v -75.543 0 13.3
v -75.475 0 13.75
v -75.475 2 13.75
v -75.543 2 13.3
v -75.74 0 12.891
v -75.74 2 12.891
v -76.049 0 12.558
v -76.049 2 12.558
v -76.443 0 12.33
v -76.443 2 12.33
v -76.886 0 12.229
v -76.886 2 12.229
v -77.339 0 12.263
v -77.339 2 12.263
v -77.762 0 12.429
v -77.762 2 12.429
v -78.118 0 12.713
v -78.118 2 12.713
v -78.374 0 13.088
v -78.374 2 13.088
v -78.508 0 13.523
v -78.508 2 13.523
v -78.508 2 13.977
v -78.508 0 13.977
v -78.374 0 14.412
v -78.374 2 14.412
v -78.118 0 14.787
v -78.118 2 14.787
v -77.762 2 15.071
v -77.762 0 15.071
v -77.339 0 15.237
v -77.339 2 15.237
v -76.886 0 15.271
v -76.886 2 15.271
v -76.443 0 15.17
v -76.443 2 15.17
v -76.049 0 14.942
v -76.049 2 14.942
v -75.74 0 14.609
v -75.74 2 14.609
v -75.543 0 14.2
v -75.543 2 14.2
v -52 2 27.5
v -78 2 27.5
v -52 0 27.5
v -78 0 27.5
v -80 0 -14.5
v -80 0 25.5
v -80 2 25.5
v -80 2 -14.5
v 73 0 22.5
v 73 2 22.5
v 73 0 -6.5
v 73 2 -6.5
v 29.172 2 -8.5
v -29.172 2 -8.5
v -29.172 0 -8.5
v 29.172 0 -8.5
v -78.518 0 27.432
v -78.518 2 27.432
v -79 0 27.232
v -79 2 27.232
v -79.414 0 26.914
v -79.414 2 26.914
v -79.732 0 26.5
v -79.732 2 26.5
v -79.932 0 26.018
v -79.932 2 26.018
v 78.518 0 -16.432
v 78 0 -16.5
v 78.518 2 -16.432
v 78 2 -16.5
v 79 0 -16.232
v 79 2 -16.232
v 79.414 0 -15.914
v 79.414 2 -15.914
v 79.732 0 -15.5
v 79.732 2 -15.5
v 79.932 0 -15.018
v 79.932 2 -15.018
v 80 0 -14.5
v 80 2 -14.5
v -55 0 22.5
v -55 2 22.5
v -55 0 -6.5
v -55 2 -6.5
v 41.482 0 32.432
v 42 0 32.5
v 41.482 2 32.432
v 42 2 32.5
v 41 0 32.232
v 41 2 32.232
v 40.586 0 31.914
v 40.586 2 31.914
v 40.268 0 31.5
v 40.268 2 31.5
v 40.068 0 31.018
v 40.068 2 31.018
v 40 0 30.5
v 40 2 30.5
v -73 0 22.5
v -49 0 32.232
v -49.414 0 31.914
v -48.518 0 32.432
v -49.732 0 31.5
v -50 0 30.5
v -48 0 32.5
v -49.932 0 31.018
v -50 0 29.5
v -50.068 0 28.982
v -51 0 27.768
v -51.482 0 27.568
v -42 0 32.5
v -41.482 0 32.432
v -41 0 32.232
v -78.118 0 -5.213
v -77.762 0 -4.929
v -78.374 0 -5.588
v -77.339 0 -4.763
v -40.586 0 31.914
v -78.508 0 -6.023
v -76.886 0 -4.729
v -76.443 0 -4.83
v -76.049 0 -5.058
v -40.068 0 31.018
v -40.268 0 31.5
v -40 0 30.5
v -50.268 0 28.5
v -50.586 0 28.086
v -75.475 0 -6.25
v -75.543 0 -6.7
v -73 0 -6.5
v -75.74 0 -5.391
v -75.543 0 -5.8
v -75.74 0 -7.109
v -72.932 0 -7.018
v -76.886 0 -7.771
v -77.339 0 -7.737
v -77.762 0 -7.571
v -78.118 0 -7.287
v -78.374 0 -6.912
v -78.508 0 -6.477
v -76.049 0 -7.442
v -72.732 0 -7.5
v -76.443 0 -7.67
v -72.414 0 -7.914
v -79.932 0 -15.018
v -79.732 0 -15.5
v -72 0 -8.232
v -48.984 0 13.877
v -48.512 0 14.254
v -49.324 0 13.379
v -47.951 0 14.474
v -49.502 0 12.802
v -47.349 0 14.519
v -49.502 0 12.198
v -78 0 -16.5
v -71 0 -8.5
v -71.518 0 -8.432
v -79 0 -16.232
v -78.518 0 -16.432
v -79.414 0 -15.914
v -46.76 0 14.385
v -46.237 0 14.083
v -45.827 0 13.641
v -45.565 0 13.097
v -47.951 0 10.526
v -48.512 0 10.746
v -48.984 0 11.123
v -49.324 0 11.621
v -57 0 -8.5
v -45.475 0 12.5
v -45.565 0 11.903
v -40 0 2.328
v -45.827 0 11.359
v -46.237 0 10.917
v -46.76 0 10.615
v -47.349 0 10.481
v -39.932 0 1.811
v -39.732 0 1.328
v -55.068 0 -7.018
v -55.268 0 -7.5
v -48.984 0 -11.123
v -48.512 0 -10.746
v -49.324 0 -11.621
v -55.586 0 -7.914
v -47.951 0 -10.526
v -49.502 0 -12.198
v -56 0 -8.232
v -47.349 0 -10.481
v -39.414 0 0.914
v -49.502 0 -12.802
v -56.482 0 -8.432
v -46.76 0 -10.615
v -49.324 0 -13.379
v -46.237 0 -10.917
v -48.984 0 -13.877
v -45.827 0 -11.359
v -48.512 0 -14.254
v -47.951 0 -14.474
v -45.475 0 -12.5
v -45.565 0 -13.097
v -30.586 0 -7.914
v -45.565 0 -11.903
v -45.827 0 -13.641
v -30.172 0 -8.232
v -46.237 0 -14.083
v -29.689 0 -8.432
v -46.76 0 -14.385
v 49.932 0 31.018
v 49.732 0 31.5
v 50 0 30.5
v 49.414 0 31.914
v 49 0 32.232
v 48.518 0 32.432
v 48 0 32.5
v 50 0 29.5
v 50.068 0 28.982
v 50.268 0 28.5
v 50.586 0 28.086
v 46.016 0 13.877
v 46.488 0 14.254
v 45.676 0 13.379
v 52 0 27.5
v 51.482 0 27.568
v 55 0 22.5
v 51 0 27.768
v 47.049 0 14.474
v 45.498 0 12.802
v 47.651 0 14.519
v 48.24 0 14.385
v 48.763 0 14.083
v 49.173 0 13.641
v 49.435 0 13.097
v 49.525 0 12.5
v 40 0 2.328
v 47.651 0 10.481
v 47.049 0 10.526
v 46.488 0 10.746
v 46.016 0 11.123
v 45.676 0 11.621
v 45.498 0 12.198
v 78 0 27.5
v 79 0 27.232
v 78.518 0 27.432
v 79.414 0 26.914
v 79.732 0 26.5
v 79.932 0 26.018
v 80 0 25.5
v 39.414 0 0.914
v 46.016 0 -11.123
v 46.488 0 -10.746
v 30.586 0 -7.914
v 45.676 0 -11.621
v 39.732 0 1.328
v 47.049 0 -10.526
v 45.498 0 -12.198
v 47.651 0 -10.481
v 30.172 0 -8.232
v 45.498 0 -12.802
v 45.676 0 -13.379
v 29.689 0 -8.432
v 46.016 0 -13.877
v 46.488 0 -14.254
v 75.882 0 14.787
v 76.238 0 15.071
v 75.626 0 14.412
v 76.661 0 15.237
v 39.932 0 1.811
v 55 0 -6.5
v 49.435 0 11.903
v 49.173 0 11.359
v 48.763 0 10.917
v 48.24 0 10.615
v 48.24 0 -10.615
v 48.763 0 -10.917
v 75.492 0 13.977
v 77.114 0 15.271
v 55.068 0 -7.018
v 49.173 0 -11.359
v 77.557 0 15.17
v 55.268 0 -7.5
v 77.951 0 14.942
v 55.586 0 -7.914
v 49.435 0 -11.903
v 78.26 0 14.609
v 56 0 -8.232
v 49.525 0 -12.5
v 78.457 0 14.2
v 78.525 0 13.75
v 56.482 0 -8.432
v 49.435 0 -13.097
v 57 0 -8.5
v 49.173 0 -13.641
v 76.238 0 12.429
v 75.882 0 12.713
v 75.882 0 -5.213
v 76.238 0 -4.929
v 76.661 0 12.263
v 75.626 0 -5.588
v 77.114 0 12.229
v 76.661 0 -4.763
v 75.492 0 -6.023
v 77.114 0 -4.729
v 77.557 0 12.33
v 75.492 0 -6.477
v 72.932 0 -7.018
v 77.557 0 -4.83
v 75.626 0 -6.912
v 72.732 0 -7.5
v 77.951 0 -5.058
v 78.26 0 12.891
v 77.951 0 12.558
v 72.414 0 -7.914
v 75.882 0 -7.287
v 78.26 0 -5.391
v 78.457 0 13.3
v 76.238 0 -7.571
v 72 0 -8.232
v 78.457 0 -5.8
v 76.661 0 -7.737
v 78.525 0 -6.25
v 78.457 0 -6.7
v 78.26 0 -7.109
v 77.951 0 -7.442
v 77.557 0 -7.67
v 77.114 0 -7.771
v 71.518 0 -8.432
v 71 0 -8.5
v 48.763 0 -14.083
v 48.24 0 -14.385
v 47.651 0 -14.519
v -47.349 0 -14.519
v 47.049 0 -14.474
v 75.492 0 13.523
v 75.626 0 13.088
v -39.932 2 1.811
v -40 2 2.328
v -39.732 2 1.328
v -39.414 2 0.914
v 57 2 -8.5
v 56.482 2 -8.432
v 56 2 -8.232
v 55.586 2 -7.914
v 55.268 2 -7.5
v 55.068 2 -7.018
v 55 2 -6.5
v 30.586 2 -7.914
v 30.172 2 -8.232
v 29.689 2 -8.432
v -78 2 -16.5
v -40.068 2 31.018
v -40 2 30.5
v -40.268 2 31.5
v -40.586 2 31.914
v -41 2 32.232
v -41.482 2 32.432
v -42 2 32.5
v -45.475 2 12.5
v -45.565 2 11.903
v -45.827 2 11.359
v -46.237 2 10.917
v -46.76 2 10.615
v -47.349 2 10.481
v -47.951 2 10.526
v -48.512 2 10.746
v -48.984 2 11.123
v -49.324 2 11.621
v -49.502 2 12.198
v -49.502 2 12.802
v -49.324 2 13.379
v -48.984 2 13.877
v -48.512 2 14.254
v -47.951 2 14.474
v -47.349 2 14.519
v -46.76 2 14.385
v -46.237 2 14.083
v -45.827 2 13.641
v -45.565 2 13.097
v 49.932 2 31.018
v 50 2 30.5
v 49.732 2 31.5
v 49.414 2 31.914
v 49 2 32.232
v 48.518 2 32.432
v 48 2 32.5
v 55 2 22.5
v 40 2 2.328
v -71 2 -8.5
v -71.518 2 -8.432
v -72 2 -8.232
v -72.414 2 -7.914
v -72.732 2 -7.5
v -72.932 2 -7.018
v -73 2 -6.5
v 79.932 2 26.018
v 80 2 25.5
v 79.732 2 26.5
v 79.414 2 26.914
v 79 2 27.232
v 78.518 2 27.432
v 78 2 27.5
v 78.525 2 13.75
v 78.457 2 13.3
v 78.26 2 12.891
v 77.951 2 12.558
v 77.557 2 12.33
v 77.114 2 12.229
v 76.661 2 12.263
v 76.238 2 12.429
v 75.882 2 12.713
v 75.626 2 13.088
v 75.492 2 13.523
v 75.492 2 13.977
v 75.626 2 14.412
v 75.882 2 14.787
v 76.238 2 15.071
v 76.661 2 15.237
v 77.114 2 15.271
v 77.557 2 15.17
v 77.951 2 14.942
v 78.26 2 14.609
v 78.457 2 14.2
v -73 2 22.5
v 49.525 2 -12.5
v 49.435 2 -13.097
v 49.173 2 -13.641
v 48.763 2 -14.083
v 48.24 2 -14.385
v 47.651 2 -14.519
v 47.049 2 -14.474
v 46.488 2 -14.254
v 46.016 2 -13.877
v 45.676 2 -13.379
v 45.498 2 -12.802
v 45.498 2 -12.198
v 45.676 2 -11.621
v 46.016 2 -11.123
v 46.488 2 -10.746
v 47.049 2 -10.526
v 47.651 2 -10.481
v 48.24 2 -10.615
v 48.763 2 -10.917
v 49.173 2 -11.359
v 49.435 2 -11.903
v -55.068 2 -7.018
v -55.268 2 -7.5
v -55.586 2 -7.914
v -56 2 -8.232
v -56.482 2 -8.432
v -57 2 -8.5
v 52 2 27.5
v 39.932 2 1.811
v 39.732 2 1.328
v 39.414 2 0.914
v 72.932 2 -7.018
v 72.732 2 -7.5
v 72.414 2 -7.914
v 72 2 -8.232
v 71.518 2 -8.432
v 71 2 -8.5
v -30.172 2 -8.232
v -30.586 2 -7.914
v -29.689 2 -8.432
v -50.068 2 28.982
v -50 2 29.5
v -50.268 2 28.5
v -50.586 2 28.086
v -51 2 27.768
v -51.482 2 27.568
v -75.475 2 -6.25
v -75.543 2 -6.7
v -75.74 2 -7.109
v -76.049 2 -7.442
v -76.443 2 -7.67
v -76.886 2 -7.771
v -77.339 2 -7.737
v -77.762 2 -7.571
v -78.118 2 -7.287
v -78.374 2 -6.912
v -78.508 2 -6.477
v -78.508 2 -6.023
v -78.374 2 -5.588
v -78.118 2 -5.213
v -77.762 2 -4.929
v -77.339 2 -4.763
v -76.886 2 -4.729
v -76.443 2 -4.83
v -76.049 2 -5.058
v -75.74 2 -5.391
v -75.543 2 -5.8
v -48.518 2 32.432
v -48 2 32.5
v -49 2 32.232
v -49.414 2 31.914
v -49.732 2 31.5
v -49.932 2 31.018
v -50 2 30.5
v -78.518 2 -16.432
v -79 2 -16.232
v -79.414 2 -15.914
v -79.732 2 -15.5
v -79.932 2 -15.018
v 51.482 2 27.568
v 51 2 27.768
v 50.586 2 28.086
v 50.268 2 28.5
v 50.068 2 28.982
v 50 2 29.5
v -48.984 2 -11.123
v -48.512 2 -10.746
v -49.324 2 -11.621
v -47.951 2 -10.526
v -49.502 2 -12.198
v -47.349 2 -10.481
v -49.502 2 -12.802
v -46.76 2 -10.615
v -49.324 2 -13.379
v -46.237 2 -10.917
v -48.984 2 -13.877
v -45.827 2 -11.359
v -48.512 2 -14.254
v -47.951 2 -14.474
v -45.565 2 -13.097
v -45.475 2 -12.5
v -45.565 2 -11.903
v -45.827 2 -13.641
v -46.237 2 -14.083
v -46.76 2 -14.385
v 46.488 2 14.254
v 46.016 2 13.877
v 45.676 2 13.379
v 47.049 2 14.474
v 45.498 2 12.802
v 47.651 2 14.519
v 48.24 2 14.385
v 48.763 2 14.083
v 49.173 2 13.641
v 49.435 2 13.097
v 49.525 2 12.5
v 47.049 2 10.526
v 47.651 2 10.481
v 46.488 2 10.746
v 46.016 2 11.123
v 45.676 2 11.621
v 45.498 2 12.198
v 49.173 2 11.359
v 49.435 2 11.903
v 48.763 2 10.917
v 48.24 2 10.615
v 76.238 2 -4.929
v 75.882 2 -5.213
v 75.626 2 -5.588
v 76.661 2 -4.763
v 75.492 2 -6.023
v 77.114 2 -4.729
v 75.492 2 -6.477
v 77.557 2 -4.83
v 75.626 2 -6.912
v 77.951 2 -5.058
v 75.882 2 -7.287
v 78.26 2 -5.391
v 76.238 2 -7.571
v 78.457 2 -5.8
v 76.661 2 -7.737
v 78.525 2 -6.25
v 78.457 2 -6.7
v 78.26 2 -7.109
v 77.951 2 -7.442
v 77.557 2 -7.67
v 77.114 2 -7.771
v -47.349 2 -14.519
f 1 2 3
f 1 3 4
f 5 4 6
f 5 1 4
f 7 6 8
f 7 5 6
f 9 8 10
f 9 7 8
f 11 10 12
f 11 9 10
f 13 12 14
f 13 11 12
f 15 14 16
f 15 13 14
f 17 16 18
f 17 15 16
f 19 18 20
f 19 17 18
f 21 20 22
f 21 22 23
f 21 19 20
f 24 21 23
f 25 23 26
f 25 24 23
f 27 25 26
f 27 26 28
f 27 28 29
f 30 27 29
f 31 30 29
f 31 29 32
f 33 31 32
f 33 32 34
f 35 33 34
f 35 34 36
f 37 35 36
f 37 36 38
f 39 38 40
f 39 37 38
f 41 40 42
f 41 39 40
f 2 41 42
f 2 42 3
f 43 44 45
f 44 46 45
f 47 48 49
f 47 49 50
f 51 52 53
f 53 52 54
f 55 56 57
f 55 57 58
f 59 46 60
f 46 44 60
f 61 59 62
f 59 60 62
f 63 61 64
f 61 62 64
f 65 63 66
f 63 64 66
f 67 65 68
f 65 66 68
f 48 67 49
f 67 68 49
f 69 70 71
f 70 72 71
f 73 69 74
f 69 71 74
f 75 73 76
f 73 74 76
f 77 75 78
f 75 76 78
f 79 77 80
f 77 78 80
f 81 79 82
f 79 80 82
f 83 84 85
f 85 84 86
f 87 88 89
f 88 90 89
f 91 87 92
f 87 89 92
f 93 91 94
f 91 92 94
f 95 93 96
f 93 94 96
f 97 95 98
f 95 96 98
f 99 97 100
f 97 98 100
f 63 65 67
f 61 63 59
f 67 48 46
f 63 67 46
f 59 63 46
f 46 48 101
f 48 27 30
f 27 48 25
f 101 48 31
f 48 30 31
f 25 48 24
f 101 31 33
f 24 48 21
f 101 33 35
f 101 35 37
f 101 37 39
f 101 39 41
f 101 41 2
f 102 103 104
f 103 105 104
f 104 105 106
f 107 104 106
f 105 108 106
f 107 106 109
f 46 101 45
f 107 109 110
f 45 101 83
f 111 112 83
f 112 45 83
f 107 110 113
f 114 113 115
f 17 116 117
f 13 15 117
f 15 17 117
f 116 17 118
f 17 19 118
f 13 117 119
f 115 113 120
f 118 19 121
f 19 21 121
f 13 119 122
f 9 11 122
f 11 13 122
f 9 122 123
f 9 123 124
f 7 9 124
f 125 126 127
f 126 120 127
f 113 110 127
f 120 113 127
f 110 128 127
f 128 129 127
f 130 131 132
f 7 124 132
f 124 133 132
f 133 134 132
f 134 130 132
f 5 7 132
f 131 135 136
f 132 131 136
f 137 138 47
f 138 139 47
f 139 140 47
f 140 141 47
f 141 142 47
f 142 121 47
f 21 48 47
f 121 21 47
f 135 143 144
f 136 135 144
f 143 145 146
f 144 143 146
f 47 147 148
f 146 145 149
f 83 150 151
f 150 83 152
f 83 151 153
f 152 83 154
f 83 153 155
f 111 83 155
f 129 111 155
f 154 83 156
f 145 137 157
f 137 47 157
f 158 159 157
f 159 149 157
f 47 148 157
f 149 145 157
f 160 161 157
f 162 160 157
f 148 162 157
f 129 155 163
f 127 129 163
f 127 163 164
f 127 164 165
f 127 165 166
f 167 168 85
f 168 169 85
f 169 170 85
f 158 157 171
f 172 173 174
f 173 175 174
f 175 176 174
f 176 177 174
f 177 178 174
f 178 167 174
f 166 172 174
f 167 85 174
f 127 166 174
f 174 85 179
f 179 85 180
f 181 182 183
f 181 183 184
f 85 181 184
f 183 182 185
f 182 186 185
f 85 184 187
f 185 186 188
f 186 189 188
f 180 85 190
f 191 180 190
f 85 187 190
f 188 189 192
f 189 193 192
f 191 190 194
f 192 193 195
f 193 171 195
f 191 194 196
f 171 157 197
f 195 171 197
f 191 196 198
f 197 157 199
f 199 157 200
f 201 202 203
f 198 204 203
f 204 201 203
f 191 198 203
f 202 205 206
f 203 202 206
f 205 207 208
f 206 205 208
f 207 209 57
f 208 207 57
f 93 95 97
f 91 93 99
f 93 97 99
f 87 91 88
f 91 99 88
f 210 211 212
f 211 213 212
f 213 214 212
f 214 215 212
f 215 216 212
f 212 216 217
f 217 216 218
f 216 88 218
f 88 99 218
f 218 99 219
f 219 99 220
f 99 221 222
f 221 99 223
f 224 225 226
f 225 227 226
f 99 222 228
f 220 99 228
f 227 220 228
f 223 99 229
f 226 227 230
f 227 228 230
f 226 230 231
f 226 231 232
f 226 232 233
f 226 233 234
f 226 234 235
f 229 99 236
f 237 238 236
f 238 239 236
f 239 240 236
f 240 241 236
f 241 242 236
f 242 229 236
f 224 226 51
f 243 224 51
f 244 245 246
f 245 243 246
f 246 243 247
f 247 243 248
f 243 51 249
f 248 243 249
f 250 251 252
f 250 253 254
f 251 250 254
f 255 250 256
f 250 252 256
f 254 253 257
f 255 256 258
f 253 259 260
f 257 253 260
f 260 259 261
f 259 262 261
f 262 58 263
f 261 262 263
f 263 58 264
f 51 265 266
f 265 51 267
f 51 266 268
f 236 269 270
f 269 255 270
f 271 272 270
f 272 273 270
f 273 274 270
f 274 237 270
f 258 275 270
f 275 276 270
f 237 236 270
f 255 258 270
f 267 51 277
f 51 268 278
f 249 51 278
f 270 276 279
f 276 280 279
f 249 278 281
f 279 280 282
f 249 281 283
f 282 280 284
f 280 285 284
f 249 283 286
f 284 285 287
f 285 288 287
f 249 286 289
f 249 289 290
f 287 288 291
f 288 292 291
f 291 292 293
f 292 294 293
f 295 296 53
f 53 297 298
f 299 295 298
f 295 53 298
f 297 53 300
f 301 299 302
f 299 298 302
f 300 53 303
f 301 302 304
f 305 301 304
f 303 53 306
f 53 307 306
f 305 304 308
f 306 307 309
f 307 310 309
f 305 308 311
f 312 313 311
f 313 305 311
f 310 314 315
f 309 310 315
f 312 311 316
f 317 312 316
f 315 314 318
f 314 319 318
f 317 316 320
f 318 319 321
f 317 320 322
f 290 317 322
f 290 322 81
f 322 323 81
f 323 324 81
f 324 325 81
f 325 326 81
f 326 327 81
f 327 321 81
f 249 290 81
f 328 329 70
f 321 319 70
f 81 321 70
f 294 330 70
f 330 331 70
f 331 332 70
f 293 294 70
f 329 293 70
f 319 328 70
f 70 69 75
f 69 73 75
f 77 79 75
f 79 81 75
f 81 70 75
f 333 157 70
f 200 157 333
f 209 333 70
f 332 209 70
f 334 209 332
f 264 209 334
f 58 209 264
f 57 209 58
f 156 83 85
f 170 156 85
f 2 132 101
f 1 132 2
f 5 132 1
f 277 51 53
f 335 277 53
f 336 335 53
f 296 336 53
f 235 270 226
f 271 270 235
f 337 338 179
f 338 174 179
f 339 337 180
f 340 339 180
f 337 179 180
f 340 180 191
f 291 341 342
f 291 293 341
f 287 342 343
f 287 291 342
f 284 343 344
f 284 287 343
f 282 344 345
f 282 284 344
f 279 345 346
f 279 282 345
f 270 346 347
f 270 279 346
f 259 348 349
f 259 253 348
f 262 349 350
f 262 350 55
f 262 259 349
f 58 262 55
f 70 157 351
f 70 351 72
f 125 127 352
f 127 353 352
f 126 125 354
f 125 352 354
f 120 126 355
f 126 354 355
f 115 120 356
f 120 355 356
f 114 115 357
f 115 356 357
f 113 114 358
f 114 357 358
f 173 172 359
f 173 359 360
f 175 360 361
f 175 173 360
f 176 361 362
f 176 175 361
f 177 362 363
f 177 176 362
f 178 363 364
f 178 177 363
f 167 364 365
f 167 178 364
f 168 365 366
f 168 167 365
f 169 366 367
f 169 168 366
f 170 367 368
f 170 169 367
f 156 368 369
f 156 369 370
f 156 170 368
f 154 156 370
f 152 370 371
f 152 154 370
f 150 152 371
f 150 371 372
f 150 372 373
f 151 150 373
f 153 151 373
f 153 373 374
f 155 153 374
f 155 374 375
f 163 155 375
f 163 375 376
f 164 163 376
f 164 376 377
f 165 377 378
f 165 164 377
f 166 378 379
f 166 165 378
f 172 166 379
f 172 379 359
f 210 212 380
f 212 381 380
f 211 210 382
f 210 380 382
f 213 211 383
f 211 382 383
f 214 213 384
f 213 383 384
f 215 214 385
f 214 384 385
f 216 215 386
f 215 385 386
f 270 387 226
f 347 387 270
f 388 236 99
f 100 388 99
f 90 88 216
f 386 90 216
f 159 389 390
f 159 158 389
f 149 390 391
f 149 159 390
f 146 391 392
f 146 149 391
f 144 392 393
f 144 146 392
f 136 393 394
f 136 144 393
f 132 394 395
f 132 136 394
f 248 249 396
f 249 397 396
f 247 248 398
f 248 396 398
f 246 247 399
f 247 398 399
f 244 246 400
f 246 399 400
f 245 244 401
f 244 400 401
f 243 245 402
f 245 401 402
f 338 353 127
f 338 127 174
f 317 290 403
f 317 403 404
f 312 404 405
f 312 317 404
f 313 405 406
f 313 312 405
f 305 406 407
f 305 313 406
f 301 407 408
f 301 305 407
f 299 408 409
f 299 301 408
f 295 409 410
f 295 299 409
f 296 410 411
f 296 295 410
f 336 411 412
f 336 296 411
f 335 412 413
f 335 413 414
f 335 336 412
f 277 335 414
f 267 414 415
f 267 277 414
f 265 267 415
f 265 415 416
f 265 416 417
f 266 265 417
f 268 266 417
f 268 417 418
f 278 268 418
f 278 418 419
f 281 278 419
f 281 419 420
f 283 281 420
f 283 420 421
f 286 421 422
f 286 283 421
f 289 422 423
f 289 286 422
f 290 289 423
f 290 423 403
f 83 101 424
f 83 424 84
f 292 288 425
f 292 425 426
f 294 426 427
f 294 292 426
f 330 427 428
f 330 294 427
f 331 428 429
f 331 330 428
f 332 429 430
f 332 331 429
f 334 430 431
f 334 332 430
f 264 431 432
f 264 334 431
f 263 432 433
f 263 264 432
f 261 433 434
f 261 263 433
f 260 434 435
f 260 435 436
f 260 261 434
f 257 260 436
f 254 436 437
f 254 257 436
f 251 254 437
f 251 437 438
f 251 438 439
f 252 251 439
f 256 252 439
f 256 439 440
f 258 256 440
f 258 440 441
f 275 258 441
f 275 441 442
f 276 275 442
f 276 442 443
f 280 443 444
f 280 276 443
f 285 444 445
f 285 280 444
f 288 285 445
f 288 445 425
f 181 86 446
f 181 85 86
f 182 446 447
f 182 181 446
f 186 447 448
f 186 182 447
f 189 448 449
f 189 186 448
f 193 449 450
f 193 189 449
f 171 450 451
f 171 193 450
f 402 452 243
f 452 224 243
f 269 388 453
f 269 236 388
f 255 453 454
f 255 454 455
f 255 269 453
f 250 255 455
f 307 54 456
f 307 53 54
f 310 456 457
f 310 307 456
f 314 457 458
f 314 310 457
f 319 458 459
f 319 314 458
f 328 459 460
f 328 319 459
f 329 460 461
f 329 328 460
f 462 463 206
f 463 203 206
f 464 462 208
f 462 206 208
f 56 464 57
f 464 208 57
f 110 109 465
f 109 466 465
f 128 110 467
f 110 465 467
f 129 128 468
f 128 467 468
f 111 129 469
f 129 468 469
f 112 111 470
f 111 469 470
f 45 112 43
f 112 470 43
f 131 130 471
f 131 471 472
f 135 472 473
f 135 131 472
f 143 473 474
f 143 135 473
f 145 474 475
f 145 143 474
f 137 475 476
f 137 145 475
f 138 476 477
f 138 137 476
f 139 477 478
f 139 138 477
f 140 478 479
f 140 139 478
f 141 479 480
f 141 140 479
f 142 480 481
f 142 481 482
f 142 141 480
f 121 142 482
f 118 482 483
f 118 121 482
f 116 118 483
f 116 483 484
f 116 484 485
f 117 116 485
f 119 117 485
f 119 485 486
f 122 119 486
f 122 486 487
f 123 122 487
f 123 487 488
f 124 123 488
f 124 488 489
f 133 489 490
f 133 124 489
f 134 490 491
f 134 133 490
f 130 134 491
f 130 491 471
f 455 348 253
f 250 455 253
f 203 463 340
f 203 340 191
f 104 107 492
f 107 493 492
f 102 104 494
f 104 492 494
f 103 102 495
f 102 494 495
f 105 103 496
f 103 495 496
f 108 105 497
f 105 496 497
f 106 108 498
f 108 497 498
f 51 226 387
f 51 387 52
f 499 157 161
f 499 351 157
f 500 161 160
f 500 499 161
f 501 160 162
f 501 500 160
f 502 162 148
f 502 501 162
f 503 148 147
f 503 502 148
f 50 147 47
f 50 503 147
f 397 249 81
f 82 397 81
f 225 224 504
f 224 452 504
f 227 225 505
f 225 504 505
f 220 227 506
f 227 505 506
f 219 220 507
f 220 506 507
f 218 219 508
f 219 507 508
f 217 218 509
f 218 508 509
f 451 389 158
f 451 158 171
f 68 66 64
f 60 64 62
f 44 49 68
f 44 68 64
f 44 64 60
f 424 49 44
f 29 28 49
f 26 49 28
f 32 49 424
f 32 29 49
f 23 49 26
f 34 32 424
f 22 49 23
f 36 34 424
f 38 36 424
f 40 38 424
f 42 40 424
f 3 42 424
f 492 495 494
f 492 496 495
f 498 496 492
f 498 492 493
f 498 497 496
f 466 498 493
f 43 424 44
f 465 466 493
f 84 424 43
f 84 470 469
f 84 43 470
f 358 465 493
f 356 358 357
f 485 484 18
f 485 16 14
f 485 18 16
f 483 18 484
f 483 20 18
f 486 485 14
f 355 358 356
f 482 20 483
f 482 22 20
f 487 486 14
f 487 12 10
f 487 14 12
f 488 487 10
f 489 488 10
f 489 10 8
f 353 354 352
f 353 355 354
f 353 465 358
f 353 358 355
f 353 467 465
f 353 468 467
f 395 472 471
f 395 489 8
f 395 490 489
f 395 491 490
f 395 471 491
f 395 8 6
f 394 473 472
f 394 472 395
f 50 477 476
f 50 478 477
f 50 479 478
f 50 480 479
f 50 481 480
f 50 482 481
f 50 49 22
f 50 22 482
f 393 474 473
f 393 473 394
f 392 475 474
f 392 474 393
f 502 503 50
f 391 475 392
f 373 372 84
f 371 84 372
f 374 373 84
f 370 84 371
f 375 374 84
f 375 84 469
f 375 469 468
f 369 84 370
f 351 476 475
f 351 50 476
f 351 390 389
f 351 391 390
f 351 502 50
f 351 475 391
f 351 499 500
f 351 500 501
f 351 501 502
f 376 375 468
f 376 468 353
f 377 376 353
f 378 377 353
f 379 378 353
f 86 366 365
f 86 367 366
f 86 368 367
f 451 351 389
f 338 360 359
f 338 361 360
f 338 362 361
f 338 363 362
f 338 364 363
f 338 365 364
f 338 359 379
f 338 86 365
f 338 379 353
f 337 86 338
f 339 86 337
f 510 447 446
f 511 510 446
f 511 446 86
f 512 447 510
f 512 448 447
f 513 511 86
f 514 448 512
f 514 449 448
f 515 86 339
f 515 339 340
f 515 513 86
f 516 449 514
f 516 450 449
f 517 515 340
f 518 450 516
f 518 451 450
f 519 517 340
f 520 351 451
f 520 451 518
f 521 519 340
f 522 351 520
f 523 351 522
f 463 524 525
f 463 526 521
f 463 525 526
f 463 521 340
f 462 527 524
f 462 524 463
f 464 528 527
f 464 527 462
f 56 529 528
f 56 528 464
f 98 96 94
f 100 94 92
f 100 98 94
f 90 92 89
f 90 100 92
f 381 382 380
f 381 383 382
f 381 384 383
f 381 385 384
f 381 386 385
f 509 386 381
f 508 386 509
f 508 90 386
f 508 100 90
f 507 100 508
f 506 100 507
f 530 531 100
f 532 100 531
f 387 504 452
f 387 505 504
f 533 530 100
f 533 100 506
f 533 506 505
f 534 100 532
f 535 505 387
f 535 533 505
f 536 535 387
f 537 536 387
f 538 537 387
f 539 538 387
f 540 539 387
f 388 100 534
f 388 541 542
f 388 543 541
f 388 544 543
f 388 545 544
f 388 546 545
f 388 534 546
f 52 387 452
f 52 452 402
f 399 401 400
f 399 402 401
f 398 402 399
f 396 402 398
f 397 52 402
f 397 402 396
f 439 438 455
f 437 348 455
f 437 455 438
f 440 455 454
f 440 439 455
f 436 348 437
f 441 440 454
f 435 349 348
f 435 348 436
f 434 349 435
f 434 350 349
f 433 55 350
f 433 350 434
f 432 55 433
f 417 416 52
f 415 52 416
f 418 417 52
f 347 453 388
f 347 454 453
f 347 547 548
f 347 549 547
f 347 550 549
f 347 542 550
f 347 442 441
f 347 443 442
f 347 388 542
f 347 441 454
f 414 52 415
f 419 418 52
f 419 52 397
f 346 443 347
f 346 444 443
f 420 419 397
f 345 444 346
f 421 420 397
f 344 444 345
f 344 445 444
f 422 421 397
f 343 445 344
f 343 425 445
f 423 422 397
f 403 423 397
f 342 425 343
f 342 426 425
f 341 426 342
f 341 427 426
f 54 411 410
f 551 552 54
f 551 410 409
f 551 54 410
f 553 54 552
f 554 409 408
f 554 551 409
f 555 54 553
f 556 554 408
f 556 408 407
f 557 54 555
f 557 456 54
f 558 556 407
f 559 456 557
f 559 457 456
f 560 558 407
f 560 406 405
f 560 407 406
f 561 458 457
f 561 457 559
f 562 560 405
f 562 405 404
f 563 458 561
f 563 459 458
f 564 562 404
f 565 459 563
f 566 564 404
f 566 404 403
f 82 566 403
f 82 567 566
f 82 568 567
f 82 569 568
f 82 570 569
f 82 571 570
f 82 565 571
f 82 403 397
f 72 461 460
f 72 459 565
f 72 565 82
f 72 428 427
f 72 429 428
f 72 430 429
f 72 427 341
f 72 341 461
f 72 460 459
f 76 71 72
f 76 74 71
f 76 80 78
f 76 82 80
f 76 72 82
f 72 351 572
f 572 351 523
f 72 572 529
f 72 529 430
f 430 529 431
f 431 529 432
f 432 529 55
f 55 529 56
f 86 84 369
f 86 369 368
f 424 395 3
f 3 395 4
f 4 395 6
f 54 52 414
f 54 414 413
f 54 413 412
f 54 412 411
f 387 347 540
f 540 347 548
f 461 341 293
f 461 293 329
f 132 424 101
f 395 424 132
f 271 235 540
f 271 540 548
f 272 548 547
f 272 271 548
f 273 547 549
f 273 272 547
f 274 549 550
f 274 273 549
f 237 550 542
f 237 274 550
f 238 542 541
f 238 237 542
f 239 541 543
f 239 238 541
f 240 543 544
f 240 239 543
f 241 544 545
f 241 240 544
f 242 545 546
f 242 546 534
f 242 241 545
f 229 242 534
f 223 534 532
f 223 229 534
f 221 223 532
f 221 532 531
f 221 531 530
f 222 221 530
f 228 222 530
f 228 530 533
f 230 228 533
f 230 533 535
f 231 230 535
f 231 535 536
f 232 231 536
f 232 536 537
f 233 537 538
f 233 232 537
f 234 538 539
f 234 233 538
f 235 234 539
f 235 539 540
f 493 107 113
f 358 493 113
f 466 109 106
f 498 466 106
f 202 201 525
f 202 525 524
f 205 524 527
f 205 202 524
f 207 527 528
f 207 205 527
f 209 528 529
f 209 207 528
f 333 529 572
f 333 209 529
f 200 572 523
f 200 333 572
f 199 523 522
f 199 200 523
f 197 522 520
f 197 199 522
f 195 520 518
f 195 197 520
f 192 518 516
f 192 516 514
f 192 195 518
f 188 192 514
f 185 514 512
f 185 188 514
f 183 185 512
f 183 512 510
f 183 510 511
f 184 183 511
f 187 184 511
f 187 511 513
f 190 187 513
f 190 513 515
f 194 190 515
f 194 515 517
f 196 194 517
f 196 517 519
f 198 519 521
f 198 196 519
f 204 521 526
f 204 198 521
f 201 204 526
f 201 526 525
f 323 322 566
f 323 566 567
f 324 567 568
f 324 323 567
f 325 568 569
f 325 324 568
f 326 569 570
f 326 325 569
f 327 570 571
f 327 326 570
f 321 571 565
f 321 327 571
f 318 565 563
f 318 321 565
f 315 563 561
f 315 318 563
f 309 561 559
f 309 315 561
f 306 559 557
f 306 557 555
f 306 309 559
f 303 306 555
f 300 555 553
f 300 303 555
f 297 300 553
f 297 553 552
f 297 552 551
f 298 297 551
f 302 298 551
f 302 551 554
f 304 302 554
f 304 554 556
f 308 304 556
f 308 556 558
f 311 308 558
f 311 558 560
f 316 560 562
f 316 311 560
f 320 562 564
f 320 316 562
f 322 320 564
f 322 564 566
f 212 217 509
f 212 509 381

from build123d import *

# Parameters (mm, degrees)
SKETCH_1_W          = 160
SKETCH_1_H          = 49
SKETCH_1_R          = 1.525
SKETCH_1_R_2        = 2.025
EXTRUDE_1_DEPTH     = 2
SKETCH_2_W          = 80
SKETCH_2_H          = 33
SKETCH_2_W_2        = 18
CUT_EXTRUDE_1_DEPTH = 10
CHAMFER_1_SIZE      = 10
FILLET_1_R          = 2
SKETCH_3_W          = 30
SKETCH_3_H          = 5
CUT_EXTRUDE_2_DEPTH = 10
SKETCH_4_W          = 25
SKETCH_4_H          = 5
EXTRUDE_2_DEPTH     = 2
FILLET_2_R          = 2
SKETCH_5_W          = 80
SKETCH_5_H          = 18.828427125
CUT_EXTRUDE_3_DEPTH = 10
FILLET_3_R          = 2


with BuildPart() as part:
    # 草图1 → 凸台-拉伸1 (new body)
    with BuildSketch(Plane(origin=(0, 0, 0), x_dir=(1, 0, 0), z_dir=(0, 1, 0))):
        with Locations((0, -8)):
            Rectangle(SKETCH_1_W, SKETCH_1_H)
        with Locations((-77, -13.75)):
            Circle(SKETCH_1_R, mode=Mode.SUBTRACT)
        with Locations((-77, 6.25)):
            Circle(SKETCH_1_R, mode=Mode.SUBTRACT)
        with Locations((77, 6.25)):
            Circle(SKETCH_1_R, mode=Mode.SUBTRACT)
        with Locations((77, -13.75)):
            Circle(SKETCH_1_R, mode=Mode.SUBTRACT)
        with Locations((-47.5, 12.5)):
            Circle(SKETCH_1_R_2, mode=Mode.SUBTRACT)
        with Locations((-47.5, -12.5)):
            Circle(SKETCH_1_R_2, mode=Mode.SUBTRACT)
        with Locations((47.5, 12.5)):
            Circle(SKETCH_1_R_2, mode=Mode.SUBTRACT)
        with Locations((47.5, -12.5)):
            Circle(SKETCH_1_R_2, mode=Mode.SUBTRACT)
    extrude(amount=EXTRUDE_1_DEPTH)

    # 草图2 → 切除-拉伸1 (cut)
    with BuildSketch(Plane(origin=(0, 2, 0), x_dir=(1, 0, 0), z_dir=(0, 1, 0))):
        with Locations((0, -8)):
            Rectangle(SKETCH_2_W, SKETCH_2_H)
        with Locations((64, -8)):
            Rectangle(SKETCH_2_W_2, SKETCH_2_H)
        with Locations((-64, -8)):
            Rectangle(SKETCH_2_W_2, SKETCH_2_H)
    extrude(amount=-CUT_EXTRUDE_1_DEPTH, mode=Mode.SUBTRACT)

    # 倒角1
    chamfer_1_edges = [part.edges().sort_by_distance(p)[0] for p in [
        (40, 1, -8.5),
        (40, 1, 24.5),
        (-40, 1, 24.5),
        (-40, 1, -8.5),
    ]]
    chamfer(chamfer_1_edges, length=CHAMFER_1_SIZE)

    # 圆角1
    fillet_1_edges = [part.edges().sort_by_distance(p)[0] for p in [
        (30, 1, 24.5),
        (-30, 1, 24.5),
        (-40, 1, 1.5),
        (-40, 1, 14.5),
        (40, 1, 1.5),
        (40, 1, 14.5),
        (-30, 1, -8.5),
        (30, 1, -8.5),
        (73, 1, -8.5),
        (73, 1, 24.5),
        (55, 1, 24.5),
        (55, 1, -8.5),
        (-73, 1, 24.5),
        (-73, 1, -8.5),
        (-55, 1, -8.5),
        (-55, 1, 24.5),
    ]]
    fillet(fillet_1_edges, radius=FILLET_1_R)

    # 草图3 → 切除-拉伸2 (cut)
    with BuildSketch(Plane.XZ):
        with Locations((-65, 30)):
            Rectangle(SKETCH_3_W, SKETCH_3_H)
        with Locations((65, 30)):
            Rectangle(SKETCH_3_W, SKETCH_3_H)
    extrude(amount=-CUT_EXTRUDE_2_DEPTH, mode=Mode.SUBTRACT)

    # 草图4 → 凸台-拉伸2 (add)
    with BuildSketch(Plane.XZ):
        with Locations((-67.5, 25)):
            Rectangle(SKETCH_4_W, SKETCH_4_H)
        with Locations((67.5, 25)):
            Rectangle(SKETCH_4_W, SKETCH_4_H)
    extrude(amount=-EXTRUDE_2_DEPTH)

    # 圆角2
    fillet_2_edges = [part.edges().sort_by_distance(p)[0] for p in [
        (50, 1, 32.5),
        (-50, 1, 32.5),
        (-50, 1, 27.5),
        (-80, 1, 27.5),
        (80, 1, 27.5),
        (50, 1, 27.5),
        (-80, 1, -16.5),
        (80, 1, -16.5),
    ]]
    fillet(fillet_2_edges, radius=FILLET_2_R)

    # 草图5 → 切除-拉伸3 (cut)
    with BuildSketch(Plane.XZ):
        with Locations((0, 23.085786438)):
            Rectangle(SKETCH_5_W, SKETCH_5_H)
    extrude(amount=-CUT_EXTRUDE_3_DEPTH, mode=Mode.SUBTRACT)

    # 圆角3
    fillet_3_edges = [part.edges().sort_by_distance(p)[0] for p in [
        (-40, 1, 32.5),
        (40, 1, 32.5),
    ]]
    fillet(fillet_3_edges, radius=FILLET_3_R)


solid = part.part
